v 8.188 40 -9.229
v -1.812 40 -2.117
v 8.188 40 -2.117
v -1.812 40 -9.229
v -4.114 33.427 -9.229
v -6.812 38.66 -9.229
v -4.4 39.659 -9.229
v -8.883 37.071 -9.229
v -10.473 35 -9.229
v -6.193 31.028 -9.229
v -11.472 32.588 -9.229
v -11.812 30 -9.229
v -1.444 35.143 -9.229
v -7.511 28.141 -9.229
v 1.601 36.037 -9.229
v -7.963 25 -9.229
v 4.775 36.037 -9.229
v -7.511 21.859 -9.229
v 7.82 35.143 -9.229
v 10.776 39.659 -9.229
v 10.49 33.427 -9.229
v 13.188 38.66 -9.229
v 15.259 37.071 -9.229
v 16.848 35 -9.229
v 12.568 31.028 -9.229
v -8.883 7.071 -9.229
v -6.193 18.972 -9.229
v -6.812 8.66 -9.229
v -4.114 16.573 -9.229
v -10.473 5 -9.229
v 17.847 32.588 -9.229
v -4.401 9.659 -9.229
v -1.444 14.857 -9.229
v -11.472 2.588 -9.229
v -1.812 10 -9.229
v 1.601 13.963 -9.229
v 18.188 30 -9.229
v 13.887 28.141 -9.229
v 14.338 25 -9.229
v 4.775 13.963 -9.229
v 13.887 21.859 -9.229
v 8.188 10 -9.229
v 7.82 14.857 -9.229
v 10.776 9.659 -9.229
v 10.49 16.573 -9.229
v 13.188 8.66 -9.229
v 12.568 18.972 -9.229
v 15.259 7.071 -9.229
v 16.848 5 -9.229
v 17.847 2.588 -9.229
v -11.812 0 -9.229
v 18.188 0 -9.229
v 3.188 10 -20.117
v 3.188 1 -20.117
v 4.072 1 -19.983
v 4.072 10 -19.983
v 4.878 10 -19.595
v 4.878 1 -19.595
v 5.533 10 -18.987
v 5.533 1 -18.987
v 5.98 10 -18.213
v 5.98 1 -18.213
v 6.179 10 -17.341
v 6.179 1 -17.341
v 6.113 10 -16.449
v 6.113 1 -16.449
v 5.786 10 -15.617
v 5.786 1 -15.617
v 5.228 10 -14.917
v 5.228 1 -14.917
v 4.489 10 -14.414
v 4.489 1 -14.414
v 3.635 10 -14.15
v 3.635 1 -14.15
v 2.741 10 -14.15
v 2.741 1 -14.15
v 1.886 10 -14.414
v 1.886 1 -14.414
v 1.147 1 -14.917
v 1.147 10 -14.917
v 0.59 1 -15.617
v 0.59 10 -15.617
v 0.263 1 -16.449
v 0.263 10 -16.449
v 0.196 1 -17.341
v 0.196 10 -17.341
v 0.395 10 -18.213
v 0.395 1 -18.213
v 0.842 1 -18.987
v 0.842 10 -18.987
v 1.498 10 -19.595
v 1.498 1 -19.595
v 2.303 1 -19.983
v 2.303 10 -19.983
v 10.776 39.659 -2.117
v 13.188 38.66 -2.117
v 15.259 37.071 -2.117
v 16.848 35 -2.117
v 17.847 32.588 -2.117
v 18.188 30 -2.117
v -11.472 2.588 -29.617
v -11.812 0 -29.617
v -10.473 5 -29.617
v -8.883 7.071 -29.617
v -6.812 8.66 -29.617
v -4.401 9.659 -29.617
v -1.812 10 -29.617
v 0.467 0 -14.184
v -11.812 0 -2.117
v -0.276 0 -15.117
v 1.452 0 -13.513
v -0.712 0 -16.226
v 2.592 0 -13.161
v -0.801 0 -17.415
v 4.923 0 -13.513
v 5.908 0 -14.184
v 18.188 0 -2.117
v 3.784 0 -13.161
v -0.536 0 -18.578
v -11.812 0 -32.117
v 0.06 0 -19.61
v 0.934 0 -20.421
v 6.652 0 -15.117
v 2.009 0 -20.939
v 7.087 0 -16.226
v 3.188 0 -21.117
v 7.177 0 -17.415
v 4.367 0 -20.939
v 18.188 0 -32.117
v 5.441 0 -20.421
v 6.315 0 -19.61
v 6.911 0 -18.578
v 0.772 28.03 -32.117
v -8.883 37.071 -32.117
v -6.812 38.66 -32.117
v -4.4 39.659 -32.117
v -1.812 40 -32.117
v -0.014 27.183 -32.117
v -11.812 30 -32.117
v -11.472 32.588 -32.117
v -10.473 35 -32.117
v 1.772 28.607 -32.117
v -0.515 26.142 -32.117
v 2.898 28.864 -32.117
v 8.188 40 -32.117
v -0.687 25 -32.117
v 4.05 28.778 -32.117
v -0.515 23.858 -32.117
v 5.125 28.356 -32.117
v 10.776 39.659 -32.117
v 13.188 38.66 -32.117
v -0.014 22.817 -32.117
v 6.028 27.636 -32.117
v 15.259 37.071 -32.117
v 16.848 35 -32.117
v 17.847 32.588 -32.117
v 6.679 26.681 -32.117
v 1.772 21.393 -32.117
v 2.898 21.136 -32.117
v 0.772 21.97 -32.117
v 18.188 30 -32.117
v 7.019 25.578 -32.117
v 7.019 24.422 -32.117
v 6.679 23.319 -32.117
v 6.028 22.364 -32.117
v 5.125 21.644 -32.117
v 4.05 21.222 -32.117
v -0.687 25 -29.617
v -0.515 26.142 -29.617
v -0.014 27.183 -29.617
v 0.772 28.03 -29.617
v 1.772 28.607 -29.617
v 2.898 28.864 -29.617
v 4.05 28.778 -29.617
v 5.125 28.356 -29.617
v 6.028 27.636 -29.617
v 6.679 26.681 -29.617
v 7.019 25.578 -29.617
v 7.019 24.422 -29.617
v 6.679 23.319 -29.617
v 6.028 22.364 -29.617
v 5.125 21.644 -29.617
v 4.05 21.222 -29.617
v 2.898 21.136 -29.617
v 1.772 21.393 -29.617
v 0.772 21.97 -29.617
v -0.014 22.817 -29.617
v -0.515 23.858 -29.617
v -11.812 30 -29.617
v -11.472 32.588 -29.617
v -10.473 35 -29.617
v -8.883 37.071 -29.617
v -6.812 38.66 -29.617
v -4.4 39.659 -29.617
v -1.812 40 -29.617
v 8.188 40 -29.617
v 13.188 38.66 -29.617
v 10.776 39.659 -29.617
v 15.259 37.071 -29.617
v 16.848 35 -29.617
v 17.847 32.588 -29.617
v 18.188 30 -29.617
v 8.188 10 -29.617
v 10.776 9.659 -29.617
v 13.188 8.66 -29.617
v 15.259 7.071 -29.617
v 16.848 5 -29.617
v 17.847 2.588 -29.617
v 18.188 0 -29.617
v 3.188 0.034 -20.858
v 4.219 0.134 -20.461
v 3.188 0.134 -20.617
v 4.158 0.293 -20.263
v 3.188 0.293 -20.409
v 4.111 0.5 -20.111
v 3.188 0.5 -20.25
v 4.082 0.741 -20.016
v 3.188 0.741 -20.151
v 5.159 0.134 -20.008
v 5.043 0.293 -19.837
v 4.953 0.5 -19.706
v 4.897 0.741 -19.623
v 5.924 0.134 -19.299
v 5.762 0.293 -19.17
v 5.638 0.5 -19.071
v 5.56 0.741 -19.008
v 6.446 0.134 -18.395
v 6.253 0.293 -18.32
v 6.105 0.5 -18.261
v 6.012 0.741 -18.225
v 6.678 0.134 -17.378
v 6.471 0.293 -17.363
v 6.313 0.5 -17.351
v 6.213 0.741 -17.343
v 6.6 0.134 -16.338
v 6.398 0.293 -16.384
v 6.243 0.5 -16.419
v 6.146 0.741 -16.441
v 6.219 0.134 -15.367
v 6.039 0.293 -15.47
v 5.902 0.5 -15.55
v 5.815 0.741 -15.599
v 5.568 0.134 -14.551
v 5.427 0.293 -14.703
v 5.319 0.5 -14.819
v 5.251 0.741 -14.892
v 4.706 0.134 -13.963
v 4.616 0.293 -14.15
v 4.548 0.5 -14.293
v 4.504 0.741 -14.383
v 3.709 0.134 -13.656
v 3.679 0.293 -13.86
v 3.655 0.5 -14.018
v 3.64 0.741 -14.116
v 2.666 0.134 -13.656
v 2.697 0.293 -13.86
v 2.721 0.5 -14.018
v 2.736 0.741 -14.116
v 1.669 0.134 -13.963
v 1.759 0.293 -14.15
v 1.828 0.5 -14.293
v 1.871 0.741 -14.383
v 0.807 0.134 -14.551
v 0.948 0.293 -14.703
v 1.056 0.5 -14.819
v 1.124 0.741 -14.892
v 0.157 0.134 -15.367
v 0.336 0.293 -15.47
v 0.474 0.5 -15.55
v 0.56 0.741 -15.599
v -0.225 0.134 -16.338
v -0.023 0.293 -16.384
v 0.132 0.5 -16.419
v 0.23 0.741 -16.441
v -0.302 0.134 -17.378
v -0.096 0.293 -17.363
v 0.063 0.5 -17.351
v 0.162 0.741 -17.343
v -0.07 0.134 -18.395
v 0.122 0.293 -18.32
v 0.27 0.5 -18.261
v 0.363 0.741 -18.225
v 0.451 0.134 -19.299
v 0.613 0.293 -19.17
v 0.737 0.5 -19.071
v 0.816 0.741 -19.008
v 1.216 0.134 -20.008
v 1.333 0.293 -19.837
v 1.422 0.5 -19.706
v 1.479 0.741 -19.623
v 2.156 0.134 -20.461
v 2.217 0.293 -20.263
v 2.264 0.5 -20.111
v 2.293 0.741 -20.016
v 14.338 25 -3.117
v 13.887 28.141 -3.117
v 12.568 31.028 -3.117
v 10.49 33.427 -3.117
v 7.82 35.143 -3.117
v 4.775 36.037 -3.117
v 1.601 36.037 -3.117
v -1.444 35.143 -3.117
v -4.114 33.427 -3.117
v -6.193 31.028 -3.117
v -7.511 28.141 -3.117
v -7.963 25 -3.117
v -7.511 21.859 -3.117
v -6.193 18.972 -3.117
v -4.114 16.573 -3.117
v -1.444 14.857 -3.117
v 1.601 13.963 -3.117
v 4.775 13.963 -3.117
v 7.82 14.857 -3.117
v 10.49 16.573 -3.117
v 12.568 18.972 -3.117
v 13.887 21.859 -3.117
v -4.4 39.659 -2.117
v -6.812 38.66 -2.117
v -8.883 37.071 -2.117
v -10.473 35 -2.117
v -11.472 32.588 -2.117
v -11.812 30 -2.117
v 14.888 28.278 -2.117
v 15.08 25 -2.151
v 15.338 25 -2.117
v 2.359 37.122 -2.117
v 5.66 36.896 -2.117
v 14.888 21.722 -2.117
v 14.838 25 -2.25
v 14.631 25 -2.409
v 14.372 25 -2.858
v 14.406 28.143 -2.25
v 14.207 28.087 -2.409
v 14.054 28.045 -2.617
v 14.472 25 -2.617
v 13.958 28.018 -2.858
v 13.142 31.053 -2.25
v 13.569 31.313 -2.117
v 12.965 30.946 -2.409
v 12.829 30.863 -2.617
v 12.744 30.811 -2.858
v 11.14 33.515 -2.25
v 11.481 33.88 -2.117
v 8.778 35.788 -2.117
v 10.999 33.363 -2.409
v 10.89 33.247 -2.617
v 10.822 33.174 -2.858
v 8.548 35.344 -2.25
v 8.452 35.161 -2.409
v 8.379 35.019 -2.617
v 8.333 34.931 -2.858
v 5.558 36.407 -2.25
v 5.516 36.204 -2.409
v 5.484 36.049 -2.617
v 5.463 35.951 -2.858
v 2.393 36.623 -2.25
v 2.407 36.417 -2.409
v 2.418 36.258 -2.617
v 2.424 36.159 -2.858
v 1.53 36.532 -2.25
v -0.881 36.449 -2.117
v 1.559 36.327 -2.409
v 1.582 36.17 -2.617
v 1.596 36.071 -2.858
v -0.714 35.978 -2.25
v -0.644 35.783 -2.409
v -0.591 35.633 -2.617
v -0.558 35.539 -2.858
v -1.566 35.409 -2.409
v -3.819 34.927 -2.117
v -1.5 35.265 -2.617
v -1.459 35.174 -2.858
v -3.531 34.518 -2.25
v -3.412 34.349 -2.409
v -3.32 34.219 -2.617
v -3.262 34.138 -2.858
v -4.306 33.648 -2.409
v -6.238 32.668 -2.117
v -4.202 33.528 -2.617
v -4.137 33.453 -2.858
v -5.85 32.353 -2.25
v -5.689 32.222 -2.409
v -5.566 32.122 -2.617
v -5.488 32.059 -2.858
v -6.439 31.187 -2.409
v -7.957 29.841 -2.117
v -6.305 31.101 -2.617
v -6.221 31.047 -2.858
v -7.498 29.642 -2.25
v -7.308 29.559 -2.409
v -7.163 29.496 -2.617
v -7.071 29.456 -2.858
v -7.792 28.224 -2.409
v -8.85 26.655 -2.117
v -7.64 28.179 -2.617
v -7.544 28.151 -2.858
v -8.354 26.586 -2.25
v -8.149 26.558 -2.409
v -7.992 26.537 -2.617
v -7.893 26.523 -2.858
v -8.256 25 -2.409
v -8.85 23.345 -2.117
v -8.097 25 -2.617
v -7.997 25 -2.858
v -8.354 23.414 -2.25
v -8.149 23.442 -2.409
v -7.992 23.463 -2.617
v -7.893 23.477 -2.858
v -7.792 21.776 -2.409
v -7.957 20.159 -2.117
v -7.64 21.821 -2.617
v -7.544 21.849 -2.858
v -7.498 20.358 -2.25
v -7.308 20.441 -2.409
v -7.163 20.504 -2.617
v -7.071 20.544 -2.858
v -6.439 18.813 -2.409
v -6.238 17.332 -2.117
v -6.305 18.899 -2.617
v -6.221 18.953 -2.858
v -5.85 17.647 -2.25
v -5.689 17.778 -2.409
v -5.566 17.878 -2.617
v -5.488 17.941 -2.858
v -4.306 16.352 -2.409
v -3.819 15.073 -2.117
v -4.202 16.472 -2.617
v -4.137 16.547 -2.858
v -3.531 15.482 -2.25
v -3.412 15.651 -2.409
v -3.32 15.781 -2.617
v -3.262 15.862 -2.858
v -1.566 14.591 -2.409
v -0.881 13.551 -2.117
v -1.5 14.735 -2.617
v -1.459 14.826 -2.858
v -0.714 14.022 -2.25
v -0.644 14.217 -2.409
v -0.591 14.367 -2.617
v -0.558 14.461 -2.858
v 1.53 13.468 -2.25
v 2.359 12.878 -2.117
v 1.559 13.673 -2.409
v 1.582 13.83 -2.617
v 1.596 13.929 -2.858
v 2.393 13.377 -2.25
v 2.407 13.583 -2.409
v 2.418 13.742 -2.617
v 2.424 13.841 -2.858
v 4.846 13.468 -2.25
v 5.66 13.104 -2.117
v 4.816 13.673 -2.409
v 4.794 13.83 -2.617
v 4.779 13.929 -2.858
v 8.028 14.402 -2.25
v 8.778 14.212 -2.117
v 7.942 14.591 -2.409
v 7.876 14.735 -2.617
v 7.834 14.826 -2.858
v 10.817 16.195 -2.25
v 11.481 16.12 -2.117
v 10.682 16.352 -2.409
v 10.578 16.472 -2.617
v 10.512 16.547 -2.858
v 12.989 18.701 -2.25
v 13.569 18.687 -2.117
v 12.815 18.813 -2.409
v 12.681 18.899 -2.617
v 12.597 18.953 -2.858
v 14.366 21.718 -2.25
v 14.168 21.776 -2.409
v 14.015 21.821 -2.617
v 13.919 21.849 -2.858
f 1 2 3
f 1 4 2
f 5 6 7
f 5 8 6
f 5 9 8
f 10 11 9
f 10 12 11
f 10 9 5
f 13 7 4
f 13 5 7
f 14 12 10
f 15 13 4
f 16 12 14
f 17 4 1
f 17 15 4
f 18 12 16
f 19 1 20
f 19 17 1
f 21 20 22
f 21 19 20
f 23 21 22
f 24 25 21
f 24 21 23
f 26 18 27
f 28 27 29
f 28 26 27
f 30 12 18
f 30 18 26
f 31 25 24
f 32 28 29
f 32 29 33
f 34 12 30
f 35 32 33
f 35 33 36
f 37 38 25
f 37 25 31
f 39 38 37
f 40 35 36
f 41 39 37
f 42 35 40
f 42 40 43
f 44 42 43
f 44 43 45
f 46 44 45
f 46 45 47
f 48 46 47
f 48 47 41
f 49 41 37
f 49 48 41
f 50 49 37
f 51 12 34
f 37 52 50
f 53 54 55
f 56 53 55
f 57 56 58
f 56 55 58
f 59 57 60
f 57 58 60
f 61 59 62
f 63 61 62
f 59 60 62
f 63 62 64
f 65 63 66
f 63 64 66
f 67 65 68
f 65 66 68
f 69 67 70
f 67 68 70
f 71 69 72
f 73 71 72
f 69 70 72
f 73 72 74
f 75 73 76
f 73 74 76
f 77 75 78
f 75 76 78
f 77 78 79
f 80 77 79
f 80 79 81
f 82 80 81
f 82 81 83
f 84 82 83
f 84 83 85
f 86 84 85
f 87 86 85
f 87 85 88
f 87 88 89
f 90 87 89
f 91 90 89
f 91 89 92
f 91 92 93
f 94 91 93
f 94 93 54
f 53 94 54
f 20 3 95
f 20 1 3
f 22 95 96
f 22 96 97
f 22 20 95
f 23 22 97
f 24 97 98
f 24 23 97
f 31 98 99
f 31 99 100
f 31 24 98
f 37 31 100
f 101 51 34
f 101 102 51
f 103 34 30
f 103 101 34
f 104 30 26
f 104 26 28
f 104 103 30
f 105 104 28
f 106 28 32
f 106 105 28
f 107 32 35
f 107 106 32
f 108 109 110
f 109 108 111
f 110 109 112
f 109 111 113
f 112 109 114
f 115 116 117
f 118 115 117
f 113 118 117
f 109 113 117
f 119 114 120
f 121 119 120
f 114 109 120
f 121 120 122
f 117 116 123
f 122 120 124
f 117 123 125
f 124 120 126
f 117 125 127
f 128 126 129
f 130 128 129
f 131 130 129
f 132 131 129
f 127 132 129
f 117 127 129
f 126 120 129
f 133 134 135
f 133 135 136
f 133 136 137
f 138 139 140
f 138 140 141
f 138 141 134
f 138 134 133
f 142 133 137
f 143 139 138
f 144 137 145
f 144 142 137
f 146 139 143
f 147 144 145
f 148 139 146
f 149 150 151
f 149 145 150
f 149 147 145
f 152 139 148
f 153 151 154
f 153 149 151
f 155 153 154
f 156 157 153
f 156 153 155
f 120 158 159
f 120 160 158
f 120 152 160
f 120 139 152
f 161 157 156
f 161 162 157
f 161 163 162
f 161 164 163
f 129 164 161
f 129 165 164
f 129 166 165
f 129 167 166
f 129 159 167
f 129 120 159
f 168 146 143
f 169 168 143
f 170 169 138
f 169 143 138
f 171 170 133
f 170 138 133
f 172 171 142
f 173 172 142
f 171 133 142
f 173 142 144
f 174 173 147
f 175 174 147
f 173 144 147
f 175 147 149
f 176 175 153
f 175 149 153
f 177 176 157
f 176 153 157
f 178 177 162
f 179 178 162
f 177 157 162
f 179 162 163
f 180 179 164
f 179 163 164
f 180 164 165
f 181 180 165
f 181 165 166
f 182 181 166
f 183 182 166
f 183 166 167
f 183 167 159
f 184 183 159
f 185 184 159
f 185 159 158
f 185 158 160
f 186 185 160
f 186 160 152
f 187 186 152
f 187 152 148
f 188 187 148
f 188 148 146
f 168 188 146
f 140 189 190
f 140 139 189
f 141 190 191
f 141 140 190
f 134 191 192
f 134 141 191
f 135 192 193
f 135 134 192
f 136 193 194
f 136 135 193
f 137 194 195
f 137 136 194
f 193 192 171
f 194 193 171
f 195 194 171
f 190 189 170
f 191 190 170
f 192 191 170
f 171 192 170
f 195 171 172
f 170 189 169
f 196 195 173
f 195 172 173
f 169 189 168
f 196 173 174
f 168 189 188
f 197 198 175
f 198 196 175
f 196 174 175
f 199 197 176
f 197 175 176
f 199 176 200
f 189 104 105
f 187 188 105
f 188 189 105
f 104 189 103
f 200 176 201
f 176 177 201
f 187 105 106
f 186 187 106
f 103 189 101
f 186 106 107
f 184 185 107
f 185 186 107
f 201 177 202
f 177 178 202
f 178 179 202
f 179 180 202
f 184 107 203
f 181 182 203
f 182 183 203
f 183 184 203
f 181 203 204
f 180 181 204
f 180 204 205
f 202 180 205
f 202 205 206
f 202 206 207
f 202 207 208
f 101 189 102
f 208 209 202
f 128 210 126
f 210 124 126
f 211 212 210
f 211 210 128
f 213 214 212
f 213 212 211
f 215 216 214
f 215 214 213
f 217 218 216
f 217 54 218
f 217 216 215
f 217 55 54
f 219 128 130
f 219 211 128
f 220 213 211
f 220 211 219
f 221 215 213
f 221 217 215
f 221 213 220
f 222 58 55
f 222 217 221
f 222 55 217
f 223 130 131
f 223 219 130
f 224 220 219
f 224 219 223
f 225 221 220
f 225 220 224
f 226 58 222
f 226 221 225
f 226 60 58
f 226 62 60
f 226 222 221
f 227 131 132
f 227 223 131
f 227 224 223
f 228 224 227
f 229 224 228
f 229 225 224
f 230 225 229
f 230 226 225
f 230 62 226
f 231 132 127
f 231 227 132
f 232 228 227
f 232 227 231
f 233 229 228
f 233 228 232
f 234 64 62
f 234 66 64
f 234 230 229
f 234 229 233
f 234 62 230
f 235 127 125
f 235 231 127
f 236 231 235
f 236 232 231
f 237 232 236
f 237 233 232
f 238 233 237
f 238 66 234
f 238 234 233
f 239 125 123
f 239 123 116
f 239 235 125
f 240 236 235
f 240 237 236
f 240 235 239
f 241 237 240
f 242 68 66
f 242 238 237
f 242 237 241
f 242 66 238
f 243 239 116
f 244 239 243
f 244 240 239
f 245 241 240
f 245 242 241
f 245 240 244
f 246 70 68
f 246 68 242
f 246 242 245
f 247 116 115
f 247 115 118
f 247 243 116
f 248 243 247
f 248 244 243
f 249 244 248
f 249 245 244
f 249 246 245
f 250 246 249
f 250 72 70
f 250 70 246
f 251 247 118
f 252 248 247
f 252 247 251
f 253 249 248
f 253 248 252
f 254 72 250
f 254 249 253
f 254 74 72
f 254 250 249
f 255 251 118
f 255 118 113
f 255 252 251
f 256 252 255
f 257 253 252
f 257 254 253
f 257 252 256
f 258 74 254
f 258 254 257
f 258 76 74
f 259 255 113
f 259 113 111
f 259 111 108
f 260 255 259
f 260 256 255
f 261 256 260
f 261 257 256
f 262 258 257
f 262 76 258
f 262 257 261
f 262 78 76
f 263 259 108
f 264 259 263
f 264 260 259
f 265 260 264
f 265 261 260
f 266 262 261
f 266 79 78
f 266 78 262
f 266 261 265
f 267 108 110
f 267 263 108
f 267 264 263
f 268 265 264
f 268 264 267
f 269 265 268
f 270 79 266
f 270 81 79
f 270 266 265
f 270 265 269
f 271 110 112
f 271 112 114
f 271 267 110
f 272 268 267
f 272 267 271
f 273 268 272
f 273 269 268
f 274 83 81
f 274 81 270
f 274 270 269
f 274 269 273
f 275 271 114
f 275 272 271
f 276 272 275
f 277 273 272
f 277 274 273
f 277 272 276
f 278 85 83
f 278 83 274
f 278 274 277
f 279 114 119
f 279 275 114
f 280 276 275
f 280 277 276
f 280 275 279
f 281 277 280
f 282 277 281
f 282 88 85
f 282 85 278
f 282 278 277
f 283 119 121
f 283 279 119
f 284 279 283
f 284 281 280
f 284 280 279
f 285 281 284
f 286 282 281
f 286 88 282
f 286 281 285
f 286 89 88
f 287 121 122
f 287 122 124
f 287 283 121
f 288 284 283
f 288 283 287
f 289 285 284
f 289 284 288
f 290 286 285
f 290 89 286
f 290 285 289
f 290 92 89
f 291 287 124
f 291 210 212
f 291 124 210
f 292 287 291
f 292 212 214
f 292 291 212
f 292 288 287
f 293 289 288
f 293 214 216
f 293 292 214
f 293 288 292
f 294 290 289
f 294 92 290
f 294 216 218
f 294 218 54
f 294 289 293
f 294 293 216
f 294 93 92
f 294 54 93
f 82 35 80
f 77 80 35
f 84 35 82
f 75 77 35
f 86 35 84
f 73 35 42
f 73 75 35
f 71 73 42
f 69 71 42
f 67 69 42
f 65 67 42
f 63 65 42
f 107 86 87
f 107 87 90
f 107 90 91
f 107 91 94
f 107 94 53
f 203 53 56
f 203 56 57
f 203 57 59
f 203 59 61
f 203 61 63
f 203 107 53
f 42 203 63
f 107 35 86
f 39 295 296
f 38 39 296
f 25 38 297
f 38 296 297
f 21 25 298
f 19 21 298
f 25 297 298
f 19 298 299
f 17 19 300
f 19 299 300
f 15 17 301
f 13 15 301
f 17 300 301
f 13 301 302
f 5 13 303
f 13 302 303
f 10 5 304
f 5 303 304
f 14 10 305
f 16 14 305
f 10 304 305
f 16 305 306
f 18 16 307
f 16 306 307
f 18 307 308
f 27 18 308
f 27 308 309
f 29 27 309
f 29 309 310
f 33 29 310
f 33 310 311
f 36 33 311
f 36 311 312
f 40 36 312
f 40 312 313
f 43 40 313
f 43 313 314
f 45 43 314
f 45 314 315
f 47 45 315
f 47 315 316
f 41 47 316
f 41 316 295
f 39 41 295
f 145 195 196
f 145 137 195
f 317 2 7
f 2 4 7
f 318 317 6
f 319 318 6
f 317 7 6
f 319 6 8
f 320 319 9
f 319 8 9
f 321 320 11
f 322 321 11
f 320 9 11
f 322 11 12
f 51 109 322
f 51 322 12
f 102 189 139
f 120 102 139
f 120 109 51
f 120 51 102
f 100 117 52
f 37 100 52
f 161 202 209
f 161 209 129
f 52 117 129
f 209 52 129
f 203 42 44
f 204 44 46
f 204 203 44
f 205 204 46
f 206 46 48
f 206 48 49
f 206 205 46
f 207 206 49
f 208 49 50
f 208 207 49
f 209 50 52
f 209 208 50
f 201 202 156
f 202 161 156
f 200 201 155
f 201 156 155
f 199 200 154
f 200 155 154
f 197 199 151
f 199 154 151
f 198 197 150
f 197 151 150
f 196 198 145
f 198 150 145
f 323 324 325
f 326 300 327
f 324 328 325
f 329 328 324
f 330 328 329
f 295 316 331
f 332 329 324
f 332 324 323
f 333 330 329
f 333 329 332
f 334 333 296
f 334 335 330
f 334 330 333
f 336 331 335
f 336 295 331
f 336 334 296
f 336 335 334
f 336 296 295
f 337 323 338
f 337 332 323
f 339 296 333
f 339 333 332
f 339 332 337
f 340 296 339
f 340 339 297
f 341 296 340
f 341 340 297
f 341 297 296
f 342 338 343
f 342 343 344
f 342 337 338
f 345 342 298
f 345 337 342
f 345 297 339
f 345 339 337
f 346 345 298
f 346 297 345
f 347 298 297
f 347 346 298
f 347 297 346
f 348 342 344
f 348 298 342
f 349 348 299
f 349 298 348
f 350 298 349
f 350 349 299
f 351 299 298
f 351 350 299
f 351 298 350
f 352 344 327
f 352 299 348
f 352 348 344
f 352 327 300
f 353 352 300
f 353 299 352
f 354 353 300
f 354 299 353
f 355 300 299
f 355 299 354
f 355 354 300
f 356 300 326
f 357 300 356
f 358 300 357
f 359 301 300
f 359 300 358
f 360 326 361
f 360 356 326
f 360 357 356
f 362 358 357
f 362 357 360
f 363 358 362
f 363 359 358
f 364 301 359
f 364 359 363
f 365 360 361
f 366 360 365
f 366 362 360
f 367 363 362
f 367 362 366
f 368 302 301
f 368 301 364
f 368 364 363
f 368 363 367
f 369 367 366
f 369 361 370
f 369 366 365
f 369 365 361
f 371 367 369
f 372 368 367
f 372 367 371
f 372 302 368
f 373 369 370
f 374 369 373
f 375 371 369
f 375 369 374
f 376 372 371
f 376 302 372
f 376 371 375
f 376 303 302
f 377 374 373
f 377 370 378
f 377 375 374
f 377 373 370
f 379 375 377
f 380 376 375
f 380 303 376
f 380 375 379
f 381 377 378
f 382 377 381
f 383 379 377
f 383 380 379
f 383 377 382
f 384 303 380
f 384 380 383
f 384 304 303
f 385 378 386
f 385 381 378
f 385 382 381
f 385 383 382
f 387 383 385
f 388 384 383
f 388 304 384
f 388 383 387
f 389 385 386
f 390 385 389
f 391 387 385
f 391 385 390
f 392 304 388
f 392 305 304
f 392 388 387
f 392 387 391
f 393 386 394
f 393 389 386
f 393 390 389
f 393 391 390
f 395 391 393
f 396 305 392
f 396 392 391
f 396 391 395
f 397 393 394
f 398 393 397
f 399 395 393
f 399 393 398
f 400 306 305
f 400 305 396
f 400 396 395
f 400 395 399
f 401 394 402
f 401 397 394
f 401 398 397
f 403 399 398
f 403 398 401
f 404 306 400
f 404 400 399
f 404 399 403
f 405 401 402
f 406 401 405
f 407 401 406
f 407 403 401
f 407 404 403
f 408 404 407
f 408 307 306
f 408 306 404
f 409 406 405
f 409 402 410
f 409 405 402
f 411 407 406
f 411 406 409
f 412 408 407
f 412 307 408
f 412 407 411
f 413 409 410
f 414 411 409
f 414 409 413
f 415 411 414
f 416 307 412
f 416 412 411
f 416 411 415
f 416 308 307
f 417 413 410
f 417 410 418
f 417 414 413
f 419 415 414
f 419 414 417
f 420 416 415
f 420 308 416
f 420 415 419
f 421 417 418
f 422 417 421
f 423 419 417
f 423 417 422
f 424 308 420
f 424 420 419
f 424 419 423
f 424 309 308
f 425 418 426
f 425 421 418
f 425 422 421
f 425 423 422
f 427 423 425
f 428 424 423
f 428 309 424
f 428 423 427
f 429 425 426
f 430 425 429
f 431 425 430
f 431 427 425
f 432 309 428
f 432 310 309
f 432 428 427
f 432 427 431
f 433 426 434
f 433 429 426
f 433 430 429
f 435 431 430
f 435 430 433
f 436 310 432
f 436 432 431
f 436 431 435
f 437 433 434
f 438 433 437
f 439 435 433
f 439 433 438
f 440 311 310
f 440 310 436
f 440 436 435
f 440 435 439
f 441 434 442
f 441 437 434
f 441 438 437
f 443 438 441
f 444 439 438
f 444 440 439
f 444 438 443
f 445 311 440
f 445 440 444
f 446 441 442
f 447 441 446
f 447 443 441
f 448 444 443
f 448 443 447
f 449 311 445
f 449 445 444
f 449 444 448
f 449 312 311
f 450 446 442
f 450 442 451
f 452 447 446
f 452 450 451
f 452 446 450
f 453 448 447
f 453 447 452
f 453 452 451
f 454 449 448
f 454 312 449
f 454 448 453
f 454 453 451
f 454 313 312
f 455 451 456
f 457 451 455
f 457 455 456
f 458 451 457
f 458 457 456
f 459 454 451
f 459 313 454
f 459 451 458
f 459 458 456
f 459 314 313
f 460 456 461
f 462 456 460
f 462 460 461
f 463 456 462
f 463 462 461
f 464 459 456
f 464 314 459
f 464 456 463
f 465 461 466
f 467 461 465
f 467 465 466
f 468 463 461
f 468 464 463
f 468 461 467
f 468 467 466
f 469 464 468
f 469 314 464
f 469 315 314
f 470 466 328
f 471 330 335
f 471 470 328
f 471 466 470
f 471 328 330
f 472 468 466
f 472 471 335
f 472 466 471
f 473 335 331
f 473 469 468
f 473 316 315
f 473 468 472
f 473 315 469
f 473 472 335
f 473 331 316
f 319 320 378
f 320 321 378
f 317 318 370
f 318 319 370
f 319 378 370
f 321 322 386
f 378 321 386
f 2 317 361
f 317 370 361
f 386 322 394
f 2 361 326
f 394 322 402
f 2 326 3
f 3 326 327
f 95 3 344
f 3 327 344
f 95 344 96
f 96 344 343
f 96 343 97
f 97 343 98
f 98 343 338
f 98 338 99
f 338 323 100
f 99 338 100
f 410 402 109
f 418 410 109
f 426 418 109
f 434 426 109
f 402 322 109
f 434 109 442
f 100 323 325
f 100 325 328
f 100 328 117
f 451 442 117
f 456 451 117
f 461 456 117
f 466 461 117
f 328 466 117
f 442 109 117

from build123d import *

# Parameters (mm, degrees)
SKETCH1_W           = 30
SKETCH1_H           = 30
BOSS_EXTRUDE1_DEPTH = 10
SKETCH2_W           = 30
SKETCH2_H           = 2.5
BOSS_EXTRUDE2_DEPTH = 30
SKETCH3_W           = 30
SKETCH3_H           = 7.112
BOSS_EXTRUDE3_DEPTH = 30
CUT_EXTRUDE2_REACH  = 55.205
SKETCH4_R           = 11.1506
FILLET2_R           = 1
SKETCH5_R           = 3.875
CUT_EXTRUDE3_DEPTH  = 30
SKETCH6_R           = 3
CUT_EXTRUDE4_DEPTH  = 30
FILLET3_R           = 1
FILLET4_R           = 10
FILLET5_R           = 10
FILLET6_R           = 10
FILLET7_R           = 10


with BuildPart() as part:
    # Sketch1 → Boss-Extrude1 (new body)
    with BuildSketch(Plane(origin=(0, 0, 0), x_dir=(1, 0, 0), z_dir=(0, 1, 0))):
        with Locations((3.18772861, 17.116506927)):
            Rectangle(SKETCH1_W, SKETCH1_H)
    extrude(amount=BOSS_EXTRUDE1_DEPTH)

    # Sketch2 → Boss-Extrude2 (add)
    with BuildSketch(Plane(origin=(0, 10, 0), x_dir=(1, 0, 0), z_dir=(0, 1, 0))):
        with Locations((3.18772861, 30.866506927)):
            Rectangle(SKETCH2_W, SKETCH2_H)
    extrude(amount=BOSS_EXTRUDE2_DEPTH)

    # Sketch3 → Boss-Extrude3 (add)
    with BuildSketch(Plane(origin=(0, 10, 0), x_dir=(1, 0, 0), z_dir=(0, 1, 0))):
        with Locations((3.18772861, 5.672506927)):
            Rectangle(SKETCH3_W, SKETCH3_H)
    extrude(amount=BOSS_EXTRUDE3_DEPTH)

    # Sketch4 → Cut-Extrude2 (cut, up to next)
    with BuildSketch(Plane.XY.offset(-2.116506927), mode=Mode.PRIVATE) as cut_extrude2_sk1:
        with Locations((3.18772861, 25)):
            Circle(SKETCH4_R)
    cut_extrude2_tool1 = extrude(cut_extrude2_sk1.sketch, amount=-CUT_EXTRUDE2_REACH, mode=Mode.PRIVATE) & part.part
    add(cut_extrude2_tool1.solids().sort_by_distance((3.187729, 25, -2.116507))[0], mode=Mode.SUBTRACT)

    # Fillet2
    fillet2_edges = [part.edges().sort_by_distance(p)[0] for p in [
        (-7.96287139, 25, -2.116506927),
    ]]
    fillet(fillet2_edges, radius=FILLET2_R)

    # Sketch5 → Cut-Extrude3 (cut)
    with BuildSketch(Plane(origin=(0, 0, -32.116506927), x_dir=(-1, 0, 0), z_dir=(0, 0, -1))):
        with Locations((-3.18772861, 25)):
            Circle(SKETCH5_R)
    extrude(amount=-CUT_EXTRUDE3_DEPTH, mode=Mode.SUBTRACT)

    # Sketch6 → Cut-Extrude4 (cut)
    with BuildSketch(Plane(origin=(0, 0, 0), x_dir=(-1, 0, 0), z_dir=(0, -1, 0))):
        with Locations(Location((-3.18772861, 17.116506927, 0), (0, 0, 90))):
            Circle(SKETCH6_R)
    extrude(amount=-CUT_EXTRUDE4_DEPTH, mode=Mode.SUBTRACT)

    # Fillet3
    fillet3_edges = [part.edges().sort_by_distance(p)[0] for p in [
        (3.18772861, 0, -14.116506927),
    ]]
    fillet(fillet3_edges, radius=FILLET3_R)

    # Fillet4
    fillet4_edges = [part.edges().sort_by_distance(p)[0] for p in [
        (-11.81227139, 40, -30.866506927),
        (18.18772861, 40, -30.866506927),
    ]]
    fillet(fillet4_edges, radius=FILLET4_R)

    # Fillet5
    fillet5_edges = [part.edges().sort_by_distance(p)[0] for p in [
        (18.18772861, 10, -19.422506927),
    ]]
    fillet(fillet5_edges, radius=FILLET5_R - 0.0001)  # a hair under: the kernel refuses the full size

    # Fillet6
    fillet6_edges = [part.edges().sort_by_distance(p)[0] for p in [
        (-11.81227139, 10, -19.422506927),
    ]]
    fillet(fillet6_edges, radius=FILLET6_R - 0.0001)  # a hair under: the kernel refuses the full size

    # Fillet7
    fillet7_edges = [part.edges().sort_by_distance(p)[0] for p in [
        (-11.81227139, 40, -5.672506927),
        (18.18772861, 40, -5.672506927),
    ]]
    fillet(fillet7_edges, radius=FILLET7_R)


solid = part.part
